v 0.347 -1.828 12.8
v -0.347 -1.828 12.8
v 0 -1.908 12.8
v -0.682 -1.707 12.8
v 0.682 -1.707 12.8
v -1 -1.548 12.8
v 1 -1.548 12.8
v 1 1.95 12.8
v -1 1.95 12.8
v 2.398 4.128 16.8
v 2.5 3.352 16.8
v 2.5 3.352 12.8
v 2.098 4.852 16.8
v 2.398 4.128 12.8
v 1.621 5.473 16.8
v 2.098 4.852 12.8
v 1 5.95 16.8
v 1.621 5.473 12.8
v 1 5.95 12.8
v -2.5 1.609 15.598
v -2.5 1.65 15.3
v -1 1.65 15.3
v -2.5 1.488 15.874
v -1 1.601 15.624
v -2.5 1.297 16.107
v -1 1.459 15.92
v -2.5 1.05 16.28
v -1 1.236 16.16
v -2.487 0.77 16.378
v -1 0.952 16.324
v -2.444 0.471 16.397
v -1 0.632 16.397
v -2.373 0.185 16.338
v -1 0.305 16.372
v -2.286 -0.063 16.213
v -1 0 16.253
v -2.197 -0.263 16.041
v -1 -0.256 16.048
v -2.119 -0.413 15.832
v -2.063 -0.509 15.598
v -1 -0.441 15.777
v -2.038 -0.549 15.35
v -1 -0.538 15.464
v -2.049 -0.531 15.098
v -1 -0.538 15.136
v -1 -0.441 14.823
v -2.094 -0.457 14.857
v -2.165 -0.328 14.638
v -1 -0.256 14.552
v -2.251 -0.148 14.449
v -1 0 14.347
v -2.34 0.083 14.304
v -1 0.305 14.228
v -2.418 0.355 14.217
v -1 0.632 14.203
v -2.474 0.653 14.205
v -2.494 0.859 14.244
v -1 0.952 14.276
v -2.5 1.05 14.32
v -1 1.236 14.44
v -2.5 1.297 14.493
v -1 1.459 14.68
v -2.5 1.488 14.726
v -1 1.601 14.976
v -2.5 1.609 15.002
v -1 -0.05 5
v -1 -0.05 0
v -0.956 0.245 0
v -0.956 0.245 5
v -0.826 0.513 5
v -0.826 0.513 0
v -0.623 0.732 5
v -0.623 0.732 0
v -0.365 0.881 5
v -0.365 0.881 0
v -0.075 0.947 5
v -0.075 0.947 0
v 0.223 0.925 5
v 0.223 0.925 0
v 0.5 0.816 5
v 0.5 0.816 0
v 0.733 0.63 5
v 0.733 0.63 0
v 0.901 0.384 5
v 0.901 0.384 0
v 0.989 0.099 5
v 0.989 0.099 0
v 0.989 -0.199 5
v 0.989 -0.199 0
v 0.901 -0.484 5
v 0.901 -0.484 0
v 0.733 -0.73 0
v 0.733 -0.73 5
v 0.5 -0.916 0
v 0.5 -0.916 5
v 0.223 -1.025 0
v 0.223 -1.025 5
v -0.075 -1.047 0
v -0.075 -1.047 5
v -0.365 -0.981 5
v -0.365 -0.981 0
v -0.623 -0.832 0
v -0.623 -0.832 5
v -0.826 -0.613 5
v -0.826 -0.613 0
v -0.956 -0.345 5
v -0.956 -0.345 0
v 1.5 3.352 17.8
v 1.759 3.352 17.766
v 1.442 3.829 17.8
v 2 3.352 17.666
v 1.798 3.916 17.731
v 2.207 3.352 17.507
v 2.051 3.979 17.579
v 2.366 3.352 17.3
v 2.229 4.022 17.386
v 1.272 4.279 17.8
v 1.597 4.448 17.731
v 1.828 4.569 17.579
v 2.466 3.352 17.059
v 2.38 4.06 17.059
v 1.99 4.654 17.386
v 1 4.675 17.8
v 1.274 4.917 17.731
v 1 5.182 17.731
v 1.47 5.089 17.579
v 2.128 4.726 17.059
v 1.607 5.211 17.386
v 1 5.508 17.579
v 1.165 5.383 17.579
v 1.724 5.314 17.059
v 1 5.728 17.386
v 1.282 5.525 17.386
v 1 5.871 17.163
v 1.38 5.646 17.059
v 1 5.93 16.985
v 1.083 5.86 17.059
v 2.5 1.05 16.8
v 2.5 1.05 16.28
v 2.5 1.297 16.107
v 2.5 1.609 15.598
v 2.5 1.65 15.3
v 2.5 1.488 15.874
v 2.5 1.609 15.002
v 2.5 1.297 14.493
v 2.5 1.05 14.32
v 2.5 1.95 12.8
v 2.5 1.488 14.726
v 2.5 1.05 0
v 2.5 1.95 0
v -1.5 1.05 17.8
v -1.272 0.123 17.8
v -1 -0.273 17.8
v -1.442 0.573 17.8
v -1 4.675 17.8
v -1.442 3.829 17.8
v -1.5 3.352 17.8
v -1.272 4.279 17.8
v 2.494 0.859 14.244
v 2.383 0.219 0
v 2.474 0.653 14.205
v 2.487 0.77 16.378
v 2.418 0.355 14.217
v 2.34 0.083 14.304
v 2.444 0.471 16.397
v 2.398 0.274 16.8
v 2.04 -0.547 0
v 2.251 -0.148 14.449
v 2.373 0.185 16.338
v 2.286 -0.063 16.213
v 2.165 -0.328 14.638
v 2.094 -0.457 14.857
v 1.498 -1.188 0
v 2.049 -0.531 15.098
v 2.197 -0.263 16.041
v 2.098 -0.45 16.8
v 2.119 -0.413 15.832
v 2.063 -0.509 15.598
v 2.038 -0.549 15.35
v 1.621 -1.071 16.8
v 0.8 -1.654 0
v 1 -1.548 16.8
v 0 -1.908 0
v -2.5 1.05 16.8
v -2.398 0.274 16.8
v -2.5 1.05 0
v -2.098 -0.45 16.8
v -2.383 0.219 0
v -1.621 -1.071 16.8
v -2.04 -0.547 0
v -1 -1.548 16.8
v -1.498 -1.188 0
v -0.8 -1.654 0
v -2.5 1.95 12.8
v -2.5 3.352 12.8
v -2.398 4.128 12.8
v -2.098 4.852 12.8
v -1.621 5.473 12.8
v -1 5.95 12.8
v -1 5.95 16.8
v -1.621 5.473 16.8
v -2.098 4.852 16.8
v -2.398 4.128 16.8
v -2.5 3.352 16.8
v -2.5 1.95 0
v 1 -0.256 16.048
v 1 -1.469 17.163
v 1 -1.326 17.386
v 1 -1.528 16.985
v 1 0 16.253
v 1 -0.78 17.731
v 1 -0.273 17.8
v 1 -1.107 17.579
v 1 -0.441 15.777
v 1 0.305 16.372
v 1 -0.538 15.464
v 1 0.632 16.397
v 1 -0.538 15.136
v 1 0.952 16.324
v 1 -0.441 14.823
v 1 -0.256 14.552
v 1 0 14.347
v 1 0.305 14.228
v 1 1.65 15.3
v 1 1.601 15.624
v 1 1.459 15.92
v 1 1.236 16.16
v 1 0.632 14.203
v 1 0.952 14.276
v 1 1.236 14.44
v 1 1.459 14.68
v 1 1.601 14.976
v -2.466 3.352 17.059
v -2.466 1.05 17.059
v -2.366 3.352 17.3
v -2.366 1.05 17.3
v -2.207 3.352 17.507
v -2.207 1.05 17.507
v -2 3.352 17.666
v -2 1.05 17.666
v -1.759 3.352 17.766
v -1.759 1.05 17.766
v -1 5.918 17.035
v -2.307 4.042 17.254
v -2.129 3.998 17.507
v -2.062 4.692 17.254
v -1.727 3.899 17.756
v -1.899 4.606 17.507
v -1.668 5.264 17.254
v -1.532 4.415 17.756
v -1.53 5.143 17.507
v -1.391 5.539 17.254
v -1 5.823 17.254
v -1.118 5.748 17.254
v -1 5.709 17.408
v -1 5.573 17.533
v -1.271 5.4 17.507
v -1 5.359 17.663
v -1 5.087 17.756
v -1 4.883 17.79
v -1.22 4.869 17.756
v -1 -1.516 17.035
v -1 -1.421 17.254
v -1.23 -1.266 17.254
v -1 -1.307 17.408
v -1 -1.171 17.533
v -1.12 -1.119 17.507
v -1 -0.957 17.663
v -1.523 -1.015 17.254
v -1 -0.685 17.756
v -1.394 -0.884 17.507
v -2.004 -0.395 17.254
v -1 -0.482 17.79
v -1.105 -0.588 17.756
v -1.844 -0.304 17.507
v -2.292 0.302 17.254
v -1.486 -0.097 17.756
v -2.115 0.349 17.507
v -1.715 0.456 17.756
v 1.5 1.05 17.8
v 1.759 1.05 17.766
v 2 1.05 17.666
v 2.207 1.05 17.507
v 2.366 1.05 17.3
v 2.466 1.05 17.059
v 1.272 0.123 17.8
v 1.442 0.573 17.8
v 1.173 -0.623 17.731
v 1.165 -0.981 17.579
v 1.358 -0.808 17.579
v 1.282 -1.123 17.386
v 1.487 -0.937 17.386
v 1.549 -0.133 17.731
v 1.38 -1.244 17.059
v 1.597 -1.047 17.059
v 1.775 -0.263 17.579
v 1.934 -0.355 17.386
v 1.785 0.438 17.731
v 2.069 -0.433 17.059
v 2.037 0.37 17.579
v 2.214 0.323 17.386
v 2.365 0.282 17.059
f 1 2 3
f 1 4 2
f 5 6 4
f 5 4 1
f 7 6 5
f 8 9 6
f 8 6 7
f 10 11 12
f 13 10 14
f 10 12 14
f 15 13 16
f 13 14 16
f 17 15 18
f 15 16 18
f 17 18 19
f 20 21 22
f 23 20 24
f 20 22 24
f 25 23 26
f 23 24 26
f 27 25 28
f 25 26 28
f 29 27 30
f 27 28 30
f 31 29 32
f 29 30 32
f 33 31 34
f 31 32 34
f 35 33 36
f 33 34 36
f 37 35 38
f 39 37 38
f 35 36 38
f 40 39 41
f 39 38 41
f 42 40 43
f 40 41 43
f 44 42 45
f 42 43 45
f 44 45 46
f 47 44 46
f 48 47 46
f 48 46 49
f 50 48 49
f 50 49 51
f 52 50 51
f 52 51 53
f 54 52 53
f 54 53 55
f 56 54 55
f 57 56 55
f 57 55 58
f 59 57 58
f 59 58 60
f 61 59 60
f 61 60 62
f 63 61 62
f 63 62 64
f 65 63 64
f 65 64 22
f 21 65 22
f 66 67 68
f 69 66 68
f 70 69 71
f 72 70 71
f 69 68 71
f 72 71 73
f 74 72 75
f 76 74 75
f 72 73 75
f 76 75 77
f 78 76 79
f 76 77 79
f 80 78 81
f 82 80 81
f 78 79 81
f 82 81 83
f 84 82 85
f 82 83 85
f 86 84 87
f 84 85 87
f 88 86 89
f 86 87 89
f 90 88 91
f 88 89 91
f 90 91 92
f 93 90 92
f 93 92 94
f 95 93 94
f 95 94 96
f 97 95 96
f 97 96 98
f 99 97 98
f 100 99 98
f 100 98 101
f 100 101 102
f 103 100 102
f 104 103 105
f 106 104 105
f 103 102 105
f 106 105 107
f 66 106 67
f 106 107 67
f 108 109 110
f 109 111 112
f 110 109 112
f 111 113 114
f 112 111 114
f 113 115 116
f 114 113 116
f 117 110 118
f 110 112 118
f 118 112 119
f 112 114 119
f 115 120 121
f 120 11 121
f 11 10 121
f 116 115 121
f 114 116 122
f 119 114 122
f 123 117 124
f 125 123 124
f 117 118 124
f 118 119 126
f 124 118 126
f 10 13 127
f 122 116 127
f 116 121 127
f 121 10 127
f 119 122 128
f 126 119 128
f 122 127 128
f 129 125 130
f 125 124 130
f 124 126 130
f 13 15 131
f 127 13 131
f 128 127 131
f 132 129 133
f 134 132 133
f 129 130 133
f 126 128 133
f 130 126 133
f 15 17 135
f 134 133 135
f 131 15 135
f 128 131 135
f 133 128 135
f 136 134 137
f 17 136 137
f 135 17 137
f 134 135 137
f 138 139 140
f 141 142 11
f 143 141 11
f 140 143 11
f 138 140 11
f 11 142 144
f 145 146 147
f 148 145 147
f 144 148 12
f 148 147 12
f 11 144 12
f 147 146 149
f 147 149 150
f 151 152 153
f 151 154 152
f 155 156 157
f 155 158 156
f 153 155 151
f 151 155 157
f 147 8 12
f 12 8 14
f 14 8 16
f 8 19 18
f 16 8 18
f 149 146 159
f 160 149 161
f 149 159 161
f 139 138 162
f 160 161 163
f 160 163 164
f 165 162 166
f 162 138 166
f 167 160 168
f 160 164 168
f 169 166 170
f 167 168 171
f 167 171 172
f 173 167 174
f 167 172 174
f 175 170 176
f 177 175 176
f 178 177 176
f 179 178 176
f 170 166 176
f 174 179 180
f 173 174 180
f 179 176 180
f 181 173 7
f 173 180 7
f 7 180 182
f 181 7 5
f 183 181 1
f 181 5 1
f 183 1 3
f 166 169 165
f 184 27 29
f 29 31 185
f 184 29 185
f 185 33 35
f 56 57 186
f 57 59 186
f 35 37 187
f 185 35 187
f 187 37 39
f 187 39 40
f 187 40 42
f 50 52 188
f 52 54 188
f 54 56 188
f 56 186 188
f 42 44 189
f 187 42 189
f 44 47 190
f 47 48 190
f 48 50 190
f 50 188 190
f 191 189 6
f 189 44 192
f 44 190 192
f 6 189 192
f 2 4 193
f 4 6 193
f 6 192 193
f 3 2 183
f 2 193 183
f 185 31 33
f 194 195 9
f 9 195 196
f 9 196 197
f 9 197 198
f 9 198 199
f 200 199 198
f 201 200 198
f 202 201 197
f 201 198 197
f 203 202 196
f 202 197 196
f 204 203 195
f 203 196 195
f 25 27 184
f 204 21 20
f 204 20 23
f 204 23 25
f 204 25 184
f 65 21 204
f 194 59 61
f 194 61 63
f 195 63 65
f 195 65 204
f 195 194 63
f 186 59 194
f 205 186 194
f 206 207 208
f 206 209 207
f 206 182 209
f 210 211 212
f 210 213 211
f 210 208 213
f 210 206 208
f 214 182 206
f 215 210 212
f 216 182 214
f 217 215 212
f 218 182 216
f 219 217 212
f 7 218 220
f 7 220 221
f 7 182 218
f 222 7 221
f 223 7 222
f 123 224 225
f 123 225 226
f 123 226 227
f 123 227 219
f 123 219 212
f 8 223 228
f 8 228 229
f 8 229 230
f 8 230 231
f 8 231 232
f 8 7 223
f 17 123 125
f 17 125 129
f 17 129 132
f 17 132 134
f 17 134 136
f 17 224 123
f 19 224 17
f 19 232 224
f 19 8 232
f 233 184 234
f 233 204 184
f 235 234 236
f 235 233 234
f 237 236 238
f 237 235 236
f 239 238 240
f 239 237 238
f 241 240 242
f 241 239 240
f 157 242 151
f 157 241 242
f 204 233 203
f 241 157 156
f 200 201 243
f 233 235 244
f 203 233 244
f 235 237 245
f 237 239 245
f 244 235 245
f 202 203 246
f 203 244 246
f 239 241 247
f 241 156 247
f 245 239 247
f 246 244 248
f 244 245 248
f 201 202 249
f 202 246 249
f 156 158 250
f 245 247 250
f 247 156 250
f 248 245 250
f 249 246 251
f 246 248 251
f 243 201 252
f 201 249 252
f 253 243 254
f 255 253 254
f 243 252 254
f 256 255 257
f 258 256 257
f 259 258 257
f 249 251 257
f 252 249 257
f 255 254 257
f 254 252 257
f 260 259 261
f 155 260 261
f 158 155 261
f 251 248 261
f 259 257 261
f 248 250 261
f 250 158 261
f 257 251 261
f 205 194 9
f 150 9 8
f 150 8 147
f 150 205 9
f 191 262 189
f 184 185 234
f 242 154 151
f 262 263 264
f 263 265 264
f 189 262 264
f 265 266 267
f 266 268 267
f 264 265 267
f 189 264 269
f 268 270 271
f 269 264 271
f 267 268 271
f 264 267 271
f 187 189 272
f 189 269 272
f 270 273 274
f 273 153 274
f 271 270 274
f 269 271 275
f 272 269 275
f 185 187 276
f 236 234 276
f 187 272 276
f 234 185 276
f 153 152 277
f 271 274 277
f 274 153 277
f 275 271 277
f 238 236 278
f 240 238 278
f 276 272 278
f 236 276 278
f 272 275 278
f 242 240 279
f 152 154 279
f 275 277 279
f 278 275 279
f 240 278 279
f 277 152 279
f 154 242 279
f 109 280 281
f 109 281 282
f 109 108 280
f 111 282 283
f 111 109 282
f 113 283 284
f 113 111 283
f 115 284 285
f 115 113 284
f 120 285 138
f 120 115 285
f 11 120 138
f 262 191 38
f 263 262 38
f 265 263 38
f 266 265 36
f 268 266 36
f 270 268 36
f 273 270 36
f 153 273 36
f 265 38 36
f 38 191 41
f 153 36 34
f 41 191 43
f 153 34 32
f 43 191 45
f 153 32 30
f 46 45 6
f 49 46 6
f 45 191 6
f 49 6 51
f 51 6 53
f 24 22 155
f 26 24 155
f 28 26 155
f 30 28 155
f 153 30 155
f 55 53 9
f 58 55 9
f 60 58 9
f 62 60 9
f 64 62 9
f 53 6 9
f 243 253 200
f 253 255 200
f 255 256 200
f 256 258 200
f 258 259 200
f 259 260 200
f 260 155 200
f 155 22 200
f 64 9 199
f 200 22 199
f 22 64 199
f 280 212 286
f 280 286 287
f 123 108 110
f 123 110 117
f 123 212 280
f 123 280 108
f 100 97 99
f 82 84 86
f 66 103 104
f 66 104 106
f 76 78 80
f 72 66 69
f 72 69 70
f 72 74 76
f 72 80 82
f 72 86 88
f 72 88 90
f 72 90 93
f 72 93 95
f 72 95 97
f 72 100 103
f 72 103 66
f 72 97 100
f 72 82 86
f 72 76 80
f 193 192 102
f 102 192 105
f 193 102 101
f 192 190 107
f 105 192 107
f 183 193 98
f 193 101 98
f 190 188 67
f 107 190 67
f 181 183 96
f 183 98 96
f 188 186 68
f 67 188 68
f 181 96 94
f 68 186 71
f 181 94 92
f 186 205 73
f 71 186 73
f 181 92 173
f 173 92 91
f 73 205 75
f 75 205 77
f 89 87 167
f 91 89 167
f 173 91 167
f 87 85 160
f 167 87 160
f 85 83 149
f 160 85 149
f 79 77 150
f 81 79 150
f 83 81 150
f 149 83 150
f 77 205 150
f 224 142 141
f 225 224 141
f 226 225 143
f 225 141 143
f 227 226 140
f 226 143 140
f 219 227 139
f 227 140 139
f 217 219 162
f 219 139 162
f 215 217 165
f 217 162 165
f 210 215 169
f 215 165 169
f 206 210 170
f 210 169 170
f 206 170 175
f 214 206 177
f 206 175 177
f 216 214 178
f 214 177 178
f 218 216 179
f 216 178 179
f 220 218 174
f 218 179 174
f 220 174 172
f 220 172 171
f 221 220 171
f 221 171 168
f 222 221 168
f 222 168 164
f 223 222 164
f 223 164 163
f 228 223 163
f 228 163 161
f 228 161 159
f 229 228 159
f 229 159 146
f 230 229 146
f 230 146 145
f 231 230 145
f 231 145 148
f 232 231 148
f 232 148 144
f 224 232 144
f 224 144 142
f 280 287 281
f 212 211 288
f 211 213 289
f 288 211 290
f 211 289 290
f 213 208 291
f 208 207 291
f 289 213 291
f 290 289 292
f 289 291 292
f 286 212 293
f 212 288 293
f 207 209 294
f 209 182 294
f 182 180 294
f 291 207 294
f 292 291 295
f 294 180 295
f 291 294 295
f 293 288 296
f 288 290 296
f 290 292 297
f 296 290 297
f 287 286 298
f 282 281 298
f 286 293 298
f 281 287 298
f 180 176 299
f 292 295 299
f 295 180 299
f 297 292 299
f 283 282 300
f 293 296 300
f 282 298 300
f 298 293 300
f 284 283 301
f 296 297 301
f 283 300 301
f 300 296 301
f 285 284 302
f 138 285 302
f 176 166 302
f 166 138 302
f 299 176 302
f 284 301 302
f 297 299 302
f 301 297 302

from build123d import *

# Parameters (mm, degrees)
SKETCH_1_W          = 5
SKETCH_1_H          = 3.9
EXTRUDE_1_DEPTH     = 12.8
SKETCH_2_R          = 1
CUT_EXTRUDE_1_DEPTH = 5
SKETCH_3_W          = 1.5
SKETCH_3_H          = 7.9
EXTRUDE_2_DEPTH     = 5
SKETCH_4_R          = 1.1
CUT_EXTRUDE_2_DEPTH = 5
FILLET_1_R          = 3
FILLET_2_R          = 3
FILLET_3_R          = 1


with BuildPart() as part:
    # 草图1 → 凸台-拉伸1 (new body)
    with BuildSketch(Plane.XY):
        Rectangle(SKETCH_1_W, SKETCH_1_H)
    extrude(amount=EXTRUDE_1_DEPTH)

    # 草图2 → 切除-拉伸1 (cut)
    with BuildSketch(Plane(origin=(0, 0, 0), x_dir=(-1, 0, 0), z_dir=(0, 0, -1))):
        with Locations((0, -0.05)):
            Circle(SKETCH_2_R)
    extrude(amount=-CUT_EXTRUDE_1_DEPTH, mode=Mode.SUBTRACT)

    # 草图3 → 凸台-拉伸2 (add)
    with BuildSketch(Plane.XY.offset(12.8)):
        with Locations((1.75, 2)):
            Rectangle(SKETCH_3_W, SKETCH_3_H)
        with Locations((-1.75, 2)):
            Rectangle(SKETCH_3_W, SKETCH_3_H)
    extrude(amount=EXTRUDE_2_DEPTH)

    # 草图4 → 切除-拉伸2 (cut)
    with BuildSketch(Plane(origin=(2.5, 0, 0), x_dir=(0, 0, -1), z_dir=(1, 0, 0))):
        with Locations(Location((-15.3, 0.55, 0), (0, 0, 90))):
            Circle(SKETCH_4_R)
    extrude(amount=-CUT_EXTRUDE_2_DEPTH, mode=Mode.SUBTRACT)

    # 圆角1
    # the kernel refuses this fillet: 3 mm, written as the material it takes off along each edge
    with BuildSketch(Plane(origin=(-2.5, -1.95, -7.5), x_dir=(0, 1, 0), z_dir=(0, 0, 1)), Plane(origin=(2.5, -1.95, 25.3), x_dir=(0, 1, 0), z_dir=(0, 0, -1))) as fillet_1_piece_1:
        with BuildLine():
            CenterArc((FILLET_1_R, -FILLET_1_R), FILLET_1_R, 90, 90)
            Line((0, -FILLET_1_R), (0, 0))
            Line((0, 0), (FILLET_1_R, 0))
        make_face()
    extrude(amount=32.8, mode=Mode.SUBTRACT)

    # 圆角2
    # the kernel refuses this fillet: 3 mm, written as the material it takes off along each edge
    with BuildSketch(Plane(origin=(2.5, 5.95, 6.304809472), x_dir=(0, -1, 0), z_dir=(0, 0, 1))) as fillet_2_piece_1:
        with BuildLine():
            CenterArc((2.598076211, -3), FILLET_2_R, 90, 60)
            Line((0, -1.5), (-0.051961524, -1.47))
            ThreePointArc((-0.051961524, -1.47), (-0.06, -0.75), (-0.06, 0))
            Line((-0.06, 0), (0, 0.06))
            Line((0, 0.06), (2.598076211, 0.06))
            Line((2.598076211, 0.06), (2.598076211, 0))
        make_face()
    extrude(amount=17.990381057, mode=Mode.SUBTRACT)
    with BuildSketch(Plane(origin=(-2.5, 5.95, 6.304809472), x_dir=(0, -1, 0), z_dir=(0, 0, 1))) as fillet_2_piece_2:
        with BuildLine():
            CenterArc((2.598076211, 3), FILLET_2_R, 210, 60)
            Line((0, 1.5), (-0.051961524, 1.47))
            ThreePointArc((-0.051961524, 1.47), (-0.06, 0.75), (-0.06, 0))
            Line((-0.06, 0), (0, -0.06))
            Line((0, -0.06), (2.598076211, -0.06))
            Line((2.598076211, -0.06), (2.598076211, 0))
        make_face()
    extrude(amount=17.990381057, mode=Mode.SUBTRACT)

    # 圆角3
    fillet_3_edges = [part.edges().sort_by_distance(p)[0] for p in [
        (-2.098076211, -0.45, 17.8),
        (2.5, 2.200961894, 17.8),
        (2.098076211, -0.45, 17.8),
        (2.098076211, 4.851923789, 17.8),
        (-2.5, 2.200961894, 17.8),
        (-2.098076211, 4.851923789, 17.8),
    ]]
    fillet(fillet_3_edges, radius=FILLET_3_R)


solid = part.part
